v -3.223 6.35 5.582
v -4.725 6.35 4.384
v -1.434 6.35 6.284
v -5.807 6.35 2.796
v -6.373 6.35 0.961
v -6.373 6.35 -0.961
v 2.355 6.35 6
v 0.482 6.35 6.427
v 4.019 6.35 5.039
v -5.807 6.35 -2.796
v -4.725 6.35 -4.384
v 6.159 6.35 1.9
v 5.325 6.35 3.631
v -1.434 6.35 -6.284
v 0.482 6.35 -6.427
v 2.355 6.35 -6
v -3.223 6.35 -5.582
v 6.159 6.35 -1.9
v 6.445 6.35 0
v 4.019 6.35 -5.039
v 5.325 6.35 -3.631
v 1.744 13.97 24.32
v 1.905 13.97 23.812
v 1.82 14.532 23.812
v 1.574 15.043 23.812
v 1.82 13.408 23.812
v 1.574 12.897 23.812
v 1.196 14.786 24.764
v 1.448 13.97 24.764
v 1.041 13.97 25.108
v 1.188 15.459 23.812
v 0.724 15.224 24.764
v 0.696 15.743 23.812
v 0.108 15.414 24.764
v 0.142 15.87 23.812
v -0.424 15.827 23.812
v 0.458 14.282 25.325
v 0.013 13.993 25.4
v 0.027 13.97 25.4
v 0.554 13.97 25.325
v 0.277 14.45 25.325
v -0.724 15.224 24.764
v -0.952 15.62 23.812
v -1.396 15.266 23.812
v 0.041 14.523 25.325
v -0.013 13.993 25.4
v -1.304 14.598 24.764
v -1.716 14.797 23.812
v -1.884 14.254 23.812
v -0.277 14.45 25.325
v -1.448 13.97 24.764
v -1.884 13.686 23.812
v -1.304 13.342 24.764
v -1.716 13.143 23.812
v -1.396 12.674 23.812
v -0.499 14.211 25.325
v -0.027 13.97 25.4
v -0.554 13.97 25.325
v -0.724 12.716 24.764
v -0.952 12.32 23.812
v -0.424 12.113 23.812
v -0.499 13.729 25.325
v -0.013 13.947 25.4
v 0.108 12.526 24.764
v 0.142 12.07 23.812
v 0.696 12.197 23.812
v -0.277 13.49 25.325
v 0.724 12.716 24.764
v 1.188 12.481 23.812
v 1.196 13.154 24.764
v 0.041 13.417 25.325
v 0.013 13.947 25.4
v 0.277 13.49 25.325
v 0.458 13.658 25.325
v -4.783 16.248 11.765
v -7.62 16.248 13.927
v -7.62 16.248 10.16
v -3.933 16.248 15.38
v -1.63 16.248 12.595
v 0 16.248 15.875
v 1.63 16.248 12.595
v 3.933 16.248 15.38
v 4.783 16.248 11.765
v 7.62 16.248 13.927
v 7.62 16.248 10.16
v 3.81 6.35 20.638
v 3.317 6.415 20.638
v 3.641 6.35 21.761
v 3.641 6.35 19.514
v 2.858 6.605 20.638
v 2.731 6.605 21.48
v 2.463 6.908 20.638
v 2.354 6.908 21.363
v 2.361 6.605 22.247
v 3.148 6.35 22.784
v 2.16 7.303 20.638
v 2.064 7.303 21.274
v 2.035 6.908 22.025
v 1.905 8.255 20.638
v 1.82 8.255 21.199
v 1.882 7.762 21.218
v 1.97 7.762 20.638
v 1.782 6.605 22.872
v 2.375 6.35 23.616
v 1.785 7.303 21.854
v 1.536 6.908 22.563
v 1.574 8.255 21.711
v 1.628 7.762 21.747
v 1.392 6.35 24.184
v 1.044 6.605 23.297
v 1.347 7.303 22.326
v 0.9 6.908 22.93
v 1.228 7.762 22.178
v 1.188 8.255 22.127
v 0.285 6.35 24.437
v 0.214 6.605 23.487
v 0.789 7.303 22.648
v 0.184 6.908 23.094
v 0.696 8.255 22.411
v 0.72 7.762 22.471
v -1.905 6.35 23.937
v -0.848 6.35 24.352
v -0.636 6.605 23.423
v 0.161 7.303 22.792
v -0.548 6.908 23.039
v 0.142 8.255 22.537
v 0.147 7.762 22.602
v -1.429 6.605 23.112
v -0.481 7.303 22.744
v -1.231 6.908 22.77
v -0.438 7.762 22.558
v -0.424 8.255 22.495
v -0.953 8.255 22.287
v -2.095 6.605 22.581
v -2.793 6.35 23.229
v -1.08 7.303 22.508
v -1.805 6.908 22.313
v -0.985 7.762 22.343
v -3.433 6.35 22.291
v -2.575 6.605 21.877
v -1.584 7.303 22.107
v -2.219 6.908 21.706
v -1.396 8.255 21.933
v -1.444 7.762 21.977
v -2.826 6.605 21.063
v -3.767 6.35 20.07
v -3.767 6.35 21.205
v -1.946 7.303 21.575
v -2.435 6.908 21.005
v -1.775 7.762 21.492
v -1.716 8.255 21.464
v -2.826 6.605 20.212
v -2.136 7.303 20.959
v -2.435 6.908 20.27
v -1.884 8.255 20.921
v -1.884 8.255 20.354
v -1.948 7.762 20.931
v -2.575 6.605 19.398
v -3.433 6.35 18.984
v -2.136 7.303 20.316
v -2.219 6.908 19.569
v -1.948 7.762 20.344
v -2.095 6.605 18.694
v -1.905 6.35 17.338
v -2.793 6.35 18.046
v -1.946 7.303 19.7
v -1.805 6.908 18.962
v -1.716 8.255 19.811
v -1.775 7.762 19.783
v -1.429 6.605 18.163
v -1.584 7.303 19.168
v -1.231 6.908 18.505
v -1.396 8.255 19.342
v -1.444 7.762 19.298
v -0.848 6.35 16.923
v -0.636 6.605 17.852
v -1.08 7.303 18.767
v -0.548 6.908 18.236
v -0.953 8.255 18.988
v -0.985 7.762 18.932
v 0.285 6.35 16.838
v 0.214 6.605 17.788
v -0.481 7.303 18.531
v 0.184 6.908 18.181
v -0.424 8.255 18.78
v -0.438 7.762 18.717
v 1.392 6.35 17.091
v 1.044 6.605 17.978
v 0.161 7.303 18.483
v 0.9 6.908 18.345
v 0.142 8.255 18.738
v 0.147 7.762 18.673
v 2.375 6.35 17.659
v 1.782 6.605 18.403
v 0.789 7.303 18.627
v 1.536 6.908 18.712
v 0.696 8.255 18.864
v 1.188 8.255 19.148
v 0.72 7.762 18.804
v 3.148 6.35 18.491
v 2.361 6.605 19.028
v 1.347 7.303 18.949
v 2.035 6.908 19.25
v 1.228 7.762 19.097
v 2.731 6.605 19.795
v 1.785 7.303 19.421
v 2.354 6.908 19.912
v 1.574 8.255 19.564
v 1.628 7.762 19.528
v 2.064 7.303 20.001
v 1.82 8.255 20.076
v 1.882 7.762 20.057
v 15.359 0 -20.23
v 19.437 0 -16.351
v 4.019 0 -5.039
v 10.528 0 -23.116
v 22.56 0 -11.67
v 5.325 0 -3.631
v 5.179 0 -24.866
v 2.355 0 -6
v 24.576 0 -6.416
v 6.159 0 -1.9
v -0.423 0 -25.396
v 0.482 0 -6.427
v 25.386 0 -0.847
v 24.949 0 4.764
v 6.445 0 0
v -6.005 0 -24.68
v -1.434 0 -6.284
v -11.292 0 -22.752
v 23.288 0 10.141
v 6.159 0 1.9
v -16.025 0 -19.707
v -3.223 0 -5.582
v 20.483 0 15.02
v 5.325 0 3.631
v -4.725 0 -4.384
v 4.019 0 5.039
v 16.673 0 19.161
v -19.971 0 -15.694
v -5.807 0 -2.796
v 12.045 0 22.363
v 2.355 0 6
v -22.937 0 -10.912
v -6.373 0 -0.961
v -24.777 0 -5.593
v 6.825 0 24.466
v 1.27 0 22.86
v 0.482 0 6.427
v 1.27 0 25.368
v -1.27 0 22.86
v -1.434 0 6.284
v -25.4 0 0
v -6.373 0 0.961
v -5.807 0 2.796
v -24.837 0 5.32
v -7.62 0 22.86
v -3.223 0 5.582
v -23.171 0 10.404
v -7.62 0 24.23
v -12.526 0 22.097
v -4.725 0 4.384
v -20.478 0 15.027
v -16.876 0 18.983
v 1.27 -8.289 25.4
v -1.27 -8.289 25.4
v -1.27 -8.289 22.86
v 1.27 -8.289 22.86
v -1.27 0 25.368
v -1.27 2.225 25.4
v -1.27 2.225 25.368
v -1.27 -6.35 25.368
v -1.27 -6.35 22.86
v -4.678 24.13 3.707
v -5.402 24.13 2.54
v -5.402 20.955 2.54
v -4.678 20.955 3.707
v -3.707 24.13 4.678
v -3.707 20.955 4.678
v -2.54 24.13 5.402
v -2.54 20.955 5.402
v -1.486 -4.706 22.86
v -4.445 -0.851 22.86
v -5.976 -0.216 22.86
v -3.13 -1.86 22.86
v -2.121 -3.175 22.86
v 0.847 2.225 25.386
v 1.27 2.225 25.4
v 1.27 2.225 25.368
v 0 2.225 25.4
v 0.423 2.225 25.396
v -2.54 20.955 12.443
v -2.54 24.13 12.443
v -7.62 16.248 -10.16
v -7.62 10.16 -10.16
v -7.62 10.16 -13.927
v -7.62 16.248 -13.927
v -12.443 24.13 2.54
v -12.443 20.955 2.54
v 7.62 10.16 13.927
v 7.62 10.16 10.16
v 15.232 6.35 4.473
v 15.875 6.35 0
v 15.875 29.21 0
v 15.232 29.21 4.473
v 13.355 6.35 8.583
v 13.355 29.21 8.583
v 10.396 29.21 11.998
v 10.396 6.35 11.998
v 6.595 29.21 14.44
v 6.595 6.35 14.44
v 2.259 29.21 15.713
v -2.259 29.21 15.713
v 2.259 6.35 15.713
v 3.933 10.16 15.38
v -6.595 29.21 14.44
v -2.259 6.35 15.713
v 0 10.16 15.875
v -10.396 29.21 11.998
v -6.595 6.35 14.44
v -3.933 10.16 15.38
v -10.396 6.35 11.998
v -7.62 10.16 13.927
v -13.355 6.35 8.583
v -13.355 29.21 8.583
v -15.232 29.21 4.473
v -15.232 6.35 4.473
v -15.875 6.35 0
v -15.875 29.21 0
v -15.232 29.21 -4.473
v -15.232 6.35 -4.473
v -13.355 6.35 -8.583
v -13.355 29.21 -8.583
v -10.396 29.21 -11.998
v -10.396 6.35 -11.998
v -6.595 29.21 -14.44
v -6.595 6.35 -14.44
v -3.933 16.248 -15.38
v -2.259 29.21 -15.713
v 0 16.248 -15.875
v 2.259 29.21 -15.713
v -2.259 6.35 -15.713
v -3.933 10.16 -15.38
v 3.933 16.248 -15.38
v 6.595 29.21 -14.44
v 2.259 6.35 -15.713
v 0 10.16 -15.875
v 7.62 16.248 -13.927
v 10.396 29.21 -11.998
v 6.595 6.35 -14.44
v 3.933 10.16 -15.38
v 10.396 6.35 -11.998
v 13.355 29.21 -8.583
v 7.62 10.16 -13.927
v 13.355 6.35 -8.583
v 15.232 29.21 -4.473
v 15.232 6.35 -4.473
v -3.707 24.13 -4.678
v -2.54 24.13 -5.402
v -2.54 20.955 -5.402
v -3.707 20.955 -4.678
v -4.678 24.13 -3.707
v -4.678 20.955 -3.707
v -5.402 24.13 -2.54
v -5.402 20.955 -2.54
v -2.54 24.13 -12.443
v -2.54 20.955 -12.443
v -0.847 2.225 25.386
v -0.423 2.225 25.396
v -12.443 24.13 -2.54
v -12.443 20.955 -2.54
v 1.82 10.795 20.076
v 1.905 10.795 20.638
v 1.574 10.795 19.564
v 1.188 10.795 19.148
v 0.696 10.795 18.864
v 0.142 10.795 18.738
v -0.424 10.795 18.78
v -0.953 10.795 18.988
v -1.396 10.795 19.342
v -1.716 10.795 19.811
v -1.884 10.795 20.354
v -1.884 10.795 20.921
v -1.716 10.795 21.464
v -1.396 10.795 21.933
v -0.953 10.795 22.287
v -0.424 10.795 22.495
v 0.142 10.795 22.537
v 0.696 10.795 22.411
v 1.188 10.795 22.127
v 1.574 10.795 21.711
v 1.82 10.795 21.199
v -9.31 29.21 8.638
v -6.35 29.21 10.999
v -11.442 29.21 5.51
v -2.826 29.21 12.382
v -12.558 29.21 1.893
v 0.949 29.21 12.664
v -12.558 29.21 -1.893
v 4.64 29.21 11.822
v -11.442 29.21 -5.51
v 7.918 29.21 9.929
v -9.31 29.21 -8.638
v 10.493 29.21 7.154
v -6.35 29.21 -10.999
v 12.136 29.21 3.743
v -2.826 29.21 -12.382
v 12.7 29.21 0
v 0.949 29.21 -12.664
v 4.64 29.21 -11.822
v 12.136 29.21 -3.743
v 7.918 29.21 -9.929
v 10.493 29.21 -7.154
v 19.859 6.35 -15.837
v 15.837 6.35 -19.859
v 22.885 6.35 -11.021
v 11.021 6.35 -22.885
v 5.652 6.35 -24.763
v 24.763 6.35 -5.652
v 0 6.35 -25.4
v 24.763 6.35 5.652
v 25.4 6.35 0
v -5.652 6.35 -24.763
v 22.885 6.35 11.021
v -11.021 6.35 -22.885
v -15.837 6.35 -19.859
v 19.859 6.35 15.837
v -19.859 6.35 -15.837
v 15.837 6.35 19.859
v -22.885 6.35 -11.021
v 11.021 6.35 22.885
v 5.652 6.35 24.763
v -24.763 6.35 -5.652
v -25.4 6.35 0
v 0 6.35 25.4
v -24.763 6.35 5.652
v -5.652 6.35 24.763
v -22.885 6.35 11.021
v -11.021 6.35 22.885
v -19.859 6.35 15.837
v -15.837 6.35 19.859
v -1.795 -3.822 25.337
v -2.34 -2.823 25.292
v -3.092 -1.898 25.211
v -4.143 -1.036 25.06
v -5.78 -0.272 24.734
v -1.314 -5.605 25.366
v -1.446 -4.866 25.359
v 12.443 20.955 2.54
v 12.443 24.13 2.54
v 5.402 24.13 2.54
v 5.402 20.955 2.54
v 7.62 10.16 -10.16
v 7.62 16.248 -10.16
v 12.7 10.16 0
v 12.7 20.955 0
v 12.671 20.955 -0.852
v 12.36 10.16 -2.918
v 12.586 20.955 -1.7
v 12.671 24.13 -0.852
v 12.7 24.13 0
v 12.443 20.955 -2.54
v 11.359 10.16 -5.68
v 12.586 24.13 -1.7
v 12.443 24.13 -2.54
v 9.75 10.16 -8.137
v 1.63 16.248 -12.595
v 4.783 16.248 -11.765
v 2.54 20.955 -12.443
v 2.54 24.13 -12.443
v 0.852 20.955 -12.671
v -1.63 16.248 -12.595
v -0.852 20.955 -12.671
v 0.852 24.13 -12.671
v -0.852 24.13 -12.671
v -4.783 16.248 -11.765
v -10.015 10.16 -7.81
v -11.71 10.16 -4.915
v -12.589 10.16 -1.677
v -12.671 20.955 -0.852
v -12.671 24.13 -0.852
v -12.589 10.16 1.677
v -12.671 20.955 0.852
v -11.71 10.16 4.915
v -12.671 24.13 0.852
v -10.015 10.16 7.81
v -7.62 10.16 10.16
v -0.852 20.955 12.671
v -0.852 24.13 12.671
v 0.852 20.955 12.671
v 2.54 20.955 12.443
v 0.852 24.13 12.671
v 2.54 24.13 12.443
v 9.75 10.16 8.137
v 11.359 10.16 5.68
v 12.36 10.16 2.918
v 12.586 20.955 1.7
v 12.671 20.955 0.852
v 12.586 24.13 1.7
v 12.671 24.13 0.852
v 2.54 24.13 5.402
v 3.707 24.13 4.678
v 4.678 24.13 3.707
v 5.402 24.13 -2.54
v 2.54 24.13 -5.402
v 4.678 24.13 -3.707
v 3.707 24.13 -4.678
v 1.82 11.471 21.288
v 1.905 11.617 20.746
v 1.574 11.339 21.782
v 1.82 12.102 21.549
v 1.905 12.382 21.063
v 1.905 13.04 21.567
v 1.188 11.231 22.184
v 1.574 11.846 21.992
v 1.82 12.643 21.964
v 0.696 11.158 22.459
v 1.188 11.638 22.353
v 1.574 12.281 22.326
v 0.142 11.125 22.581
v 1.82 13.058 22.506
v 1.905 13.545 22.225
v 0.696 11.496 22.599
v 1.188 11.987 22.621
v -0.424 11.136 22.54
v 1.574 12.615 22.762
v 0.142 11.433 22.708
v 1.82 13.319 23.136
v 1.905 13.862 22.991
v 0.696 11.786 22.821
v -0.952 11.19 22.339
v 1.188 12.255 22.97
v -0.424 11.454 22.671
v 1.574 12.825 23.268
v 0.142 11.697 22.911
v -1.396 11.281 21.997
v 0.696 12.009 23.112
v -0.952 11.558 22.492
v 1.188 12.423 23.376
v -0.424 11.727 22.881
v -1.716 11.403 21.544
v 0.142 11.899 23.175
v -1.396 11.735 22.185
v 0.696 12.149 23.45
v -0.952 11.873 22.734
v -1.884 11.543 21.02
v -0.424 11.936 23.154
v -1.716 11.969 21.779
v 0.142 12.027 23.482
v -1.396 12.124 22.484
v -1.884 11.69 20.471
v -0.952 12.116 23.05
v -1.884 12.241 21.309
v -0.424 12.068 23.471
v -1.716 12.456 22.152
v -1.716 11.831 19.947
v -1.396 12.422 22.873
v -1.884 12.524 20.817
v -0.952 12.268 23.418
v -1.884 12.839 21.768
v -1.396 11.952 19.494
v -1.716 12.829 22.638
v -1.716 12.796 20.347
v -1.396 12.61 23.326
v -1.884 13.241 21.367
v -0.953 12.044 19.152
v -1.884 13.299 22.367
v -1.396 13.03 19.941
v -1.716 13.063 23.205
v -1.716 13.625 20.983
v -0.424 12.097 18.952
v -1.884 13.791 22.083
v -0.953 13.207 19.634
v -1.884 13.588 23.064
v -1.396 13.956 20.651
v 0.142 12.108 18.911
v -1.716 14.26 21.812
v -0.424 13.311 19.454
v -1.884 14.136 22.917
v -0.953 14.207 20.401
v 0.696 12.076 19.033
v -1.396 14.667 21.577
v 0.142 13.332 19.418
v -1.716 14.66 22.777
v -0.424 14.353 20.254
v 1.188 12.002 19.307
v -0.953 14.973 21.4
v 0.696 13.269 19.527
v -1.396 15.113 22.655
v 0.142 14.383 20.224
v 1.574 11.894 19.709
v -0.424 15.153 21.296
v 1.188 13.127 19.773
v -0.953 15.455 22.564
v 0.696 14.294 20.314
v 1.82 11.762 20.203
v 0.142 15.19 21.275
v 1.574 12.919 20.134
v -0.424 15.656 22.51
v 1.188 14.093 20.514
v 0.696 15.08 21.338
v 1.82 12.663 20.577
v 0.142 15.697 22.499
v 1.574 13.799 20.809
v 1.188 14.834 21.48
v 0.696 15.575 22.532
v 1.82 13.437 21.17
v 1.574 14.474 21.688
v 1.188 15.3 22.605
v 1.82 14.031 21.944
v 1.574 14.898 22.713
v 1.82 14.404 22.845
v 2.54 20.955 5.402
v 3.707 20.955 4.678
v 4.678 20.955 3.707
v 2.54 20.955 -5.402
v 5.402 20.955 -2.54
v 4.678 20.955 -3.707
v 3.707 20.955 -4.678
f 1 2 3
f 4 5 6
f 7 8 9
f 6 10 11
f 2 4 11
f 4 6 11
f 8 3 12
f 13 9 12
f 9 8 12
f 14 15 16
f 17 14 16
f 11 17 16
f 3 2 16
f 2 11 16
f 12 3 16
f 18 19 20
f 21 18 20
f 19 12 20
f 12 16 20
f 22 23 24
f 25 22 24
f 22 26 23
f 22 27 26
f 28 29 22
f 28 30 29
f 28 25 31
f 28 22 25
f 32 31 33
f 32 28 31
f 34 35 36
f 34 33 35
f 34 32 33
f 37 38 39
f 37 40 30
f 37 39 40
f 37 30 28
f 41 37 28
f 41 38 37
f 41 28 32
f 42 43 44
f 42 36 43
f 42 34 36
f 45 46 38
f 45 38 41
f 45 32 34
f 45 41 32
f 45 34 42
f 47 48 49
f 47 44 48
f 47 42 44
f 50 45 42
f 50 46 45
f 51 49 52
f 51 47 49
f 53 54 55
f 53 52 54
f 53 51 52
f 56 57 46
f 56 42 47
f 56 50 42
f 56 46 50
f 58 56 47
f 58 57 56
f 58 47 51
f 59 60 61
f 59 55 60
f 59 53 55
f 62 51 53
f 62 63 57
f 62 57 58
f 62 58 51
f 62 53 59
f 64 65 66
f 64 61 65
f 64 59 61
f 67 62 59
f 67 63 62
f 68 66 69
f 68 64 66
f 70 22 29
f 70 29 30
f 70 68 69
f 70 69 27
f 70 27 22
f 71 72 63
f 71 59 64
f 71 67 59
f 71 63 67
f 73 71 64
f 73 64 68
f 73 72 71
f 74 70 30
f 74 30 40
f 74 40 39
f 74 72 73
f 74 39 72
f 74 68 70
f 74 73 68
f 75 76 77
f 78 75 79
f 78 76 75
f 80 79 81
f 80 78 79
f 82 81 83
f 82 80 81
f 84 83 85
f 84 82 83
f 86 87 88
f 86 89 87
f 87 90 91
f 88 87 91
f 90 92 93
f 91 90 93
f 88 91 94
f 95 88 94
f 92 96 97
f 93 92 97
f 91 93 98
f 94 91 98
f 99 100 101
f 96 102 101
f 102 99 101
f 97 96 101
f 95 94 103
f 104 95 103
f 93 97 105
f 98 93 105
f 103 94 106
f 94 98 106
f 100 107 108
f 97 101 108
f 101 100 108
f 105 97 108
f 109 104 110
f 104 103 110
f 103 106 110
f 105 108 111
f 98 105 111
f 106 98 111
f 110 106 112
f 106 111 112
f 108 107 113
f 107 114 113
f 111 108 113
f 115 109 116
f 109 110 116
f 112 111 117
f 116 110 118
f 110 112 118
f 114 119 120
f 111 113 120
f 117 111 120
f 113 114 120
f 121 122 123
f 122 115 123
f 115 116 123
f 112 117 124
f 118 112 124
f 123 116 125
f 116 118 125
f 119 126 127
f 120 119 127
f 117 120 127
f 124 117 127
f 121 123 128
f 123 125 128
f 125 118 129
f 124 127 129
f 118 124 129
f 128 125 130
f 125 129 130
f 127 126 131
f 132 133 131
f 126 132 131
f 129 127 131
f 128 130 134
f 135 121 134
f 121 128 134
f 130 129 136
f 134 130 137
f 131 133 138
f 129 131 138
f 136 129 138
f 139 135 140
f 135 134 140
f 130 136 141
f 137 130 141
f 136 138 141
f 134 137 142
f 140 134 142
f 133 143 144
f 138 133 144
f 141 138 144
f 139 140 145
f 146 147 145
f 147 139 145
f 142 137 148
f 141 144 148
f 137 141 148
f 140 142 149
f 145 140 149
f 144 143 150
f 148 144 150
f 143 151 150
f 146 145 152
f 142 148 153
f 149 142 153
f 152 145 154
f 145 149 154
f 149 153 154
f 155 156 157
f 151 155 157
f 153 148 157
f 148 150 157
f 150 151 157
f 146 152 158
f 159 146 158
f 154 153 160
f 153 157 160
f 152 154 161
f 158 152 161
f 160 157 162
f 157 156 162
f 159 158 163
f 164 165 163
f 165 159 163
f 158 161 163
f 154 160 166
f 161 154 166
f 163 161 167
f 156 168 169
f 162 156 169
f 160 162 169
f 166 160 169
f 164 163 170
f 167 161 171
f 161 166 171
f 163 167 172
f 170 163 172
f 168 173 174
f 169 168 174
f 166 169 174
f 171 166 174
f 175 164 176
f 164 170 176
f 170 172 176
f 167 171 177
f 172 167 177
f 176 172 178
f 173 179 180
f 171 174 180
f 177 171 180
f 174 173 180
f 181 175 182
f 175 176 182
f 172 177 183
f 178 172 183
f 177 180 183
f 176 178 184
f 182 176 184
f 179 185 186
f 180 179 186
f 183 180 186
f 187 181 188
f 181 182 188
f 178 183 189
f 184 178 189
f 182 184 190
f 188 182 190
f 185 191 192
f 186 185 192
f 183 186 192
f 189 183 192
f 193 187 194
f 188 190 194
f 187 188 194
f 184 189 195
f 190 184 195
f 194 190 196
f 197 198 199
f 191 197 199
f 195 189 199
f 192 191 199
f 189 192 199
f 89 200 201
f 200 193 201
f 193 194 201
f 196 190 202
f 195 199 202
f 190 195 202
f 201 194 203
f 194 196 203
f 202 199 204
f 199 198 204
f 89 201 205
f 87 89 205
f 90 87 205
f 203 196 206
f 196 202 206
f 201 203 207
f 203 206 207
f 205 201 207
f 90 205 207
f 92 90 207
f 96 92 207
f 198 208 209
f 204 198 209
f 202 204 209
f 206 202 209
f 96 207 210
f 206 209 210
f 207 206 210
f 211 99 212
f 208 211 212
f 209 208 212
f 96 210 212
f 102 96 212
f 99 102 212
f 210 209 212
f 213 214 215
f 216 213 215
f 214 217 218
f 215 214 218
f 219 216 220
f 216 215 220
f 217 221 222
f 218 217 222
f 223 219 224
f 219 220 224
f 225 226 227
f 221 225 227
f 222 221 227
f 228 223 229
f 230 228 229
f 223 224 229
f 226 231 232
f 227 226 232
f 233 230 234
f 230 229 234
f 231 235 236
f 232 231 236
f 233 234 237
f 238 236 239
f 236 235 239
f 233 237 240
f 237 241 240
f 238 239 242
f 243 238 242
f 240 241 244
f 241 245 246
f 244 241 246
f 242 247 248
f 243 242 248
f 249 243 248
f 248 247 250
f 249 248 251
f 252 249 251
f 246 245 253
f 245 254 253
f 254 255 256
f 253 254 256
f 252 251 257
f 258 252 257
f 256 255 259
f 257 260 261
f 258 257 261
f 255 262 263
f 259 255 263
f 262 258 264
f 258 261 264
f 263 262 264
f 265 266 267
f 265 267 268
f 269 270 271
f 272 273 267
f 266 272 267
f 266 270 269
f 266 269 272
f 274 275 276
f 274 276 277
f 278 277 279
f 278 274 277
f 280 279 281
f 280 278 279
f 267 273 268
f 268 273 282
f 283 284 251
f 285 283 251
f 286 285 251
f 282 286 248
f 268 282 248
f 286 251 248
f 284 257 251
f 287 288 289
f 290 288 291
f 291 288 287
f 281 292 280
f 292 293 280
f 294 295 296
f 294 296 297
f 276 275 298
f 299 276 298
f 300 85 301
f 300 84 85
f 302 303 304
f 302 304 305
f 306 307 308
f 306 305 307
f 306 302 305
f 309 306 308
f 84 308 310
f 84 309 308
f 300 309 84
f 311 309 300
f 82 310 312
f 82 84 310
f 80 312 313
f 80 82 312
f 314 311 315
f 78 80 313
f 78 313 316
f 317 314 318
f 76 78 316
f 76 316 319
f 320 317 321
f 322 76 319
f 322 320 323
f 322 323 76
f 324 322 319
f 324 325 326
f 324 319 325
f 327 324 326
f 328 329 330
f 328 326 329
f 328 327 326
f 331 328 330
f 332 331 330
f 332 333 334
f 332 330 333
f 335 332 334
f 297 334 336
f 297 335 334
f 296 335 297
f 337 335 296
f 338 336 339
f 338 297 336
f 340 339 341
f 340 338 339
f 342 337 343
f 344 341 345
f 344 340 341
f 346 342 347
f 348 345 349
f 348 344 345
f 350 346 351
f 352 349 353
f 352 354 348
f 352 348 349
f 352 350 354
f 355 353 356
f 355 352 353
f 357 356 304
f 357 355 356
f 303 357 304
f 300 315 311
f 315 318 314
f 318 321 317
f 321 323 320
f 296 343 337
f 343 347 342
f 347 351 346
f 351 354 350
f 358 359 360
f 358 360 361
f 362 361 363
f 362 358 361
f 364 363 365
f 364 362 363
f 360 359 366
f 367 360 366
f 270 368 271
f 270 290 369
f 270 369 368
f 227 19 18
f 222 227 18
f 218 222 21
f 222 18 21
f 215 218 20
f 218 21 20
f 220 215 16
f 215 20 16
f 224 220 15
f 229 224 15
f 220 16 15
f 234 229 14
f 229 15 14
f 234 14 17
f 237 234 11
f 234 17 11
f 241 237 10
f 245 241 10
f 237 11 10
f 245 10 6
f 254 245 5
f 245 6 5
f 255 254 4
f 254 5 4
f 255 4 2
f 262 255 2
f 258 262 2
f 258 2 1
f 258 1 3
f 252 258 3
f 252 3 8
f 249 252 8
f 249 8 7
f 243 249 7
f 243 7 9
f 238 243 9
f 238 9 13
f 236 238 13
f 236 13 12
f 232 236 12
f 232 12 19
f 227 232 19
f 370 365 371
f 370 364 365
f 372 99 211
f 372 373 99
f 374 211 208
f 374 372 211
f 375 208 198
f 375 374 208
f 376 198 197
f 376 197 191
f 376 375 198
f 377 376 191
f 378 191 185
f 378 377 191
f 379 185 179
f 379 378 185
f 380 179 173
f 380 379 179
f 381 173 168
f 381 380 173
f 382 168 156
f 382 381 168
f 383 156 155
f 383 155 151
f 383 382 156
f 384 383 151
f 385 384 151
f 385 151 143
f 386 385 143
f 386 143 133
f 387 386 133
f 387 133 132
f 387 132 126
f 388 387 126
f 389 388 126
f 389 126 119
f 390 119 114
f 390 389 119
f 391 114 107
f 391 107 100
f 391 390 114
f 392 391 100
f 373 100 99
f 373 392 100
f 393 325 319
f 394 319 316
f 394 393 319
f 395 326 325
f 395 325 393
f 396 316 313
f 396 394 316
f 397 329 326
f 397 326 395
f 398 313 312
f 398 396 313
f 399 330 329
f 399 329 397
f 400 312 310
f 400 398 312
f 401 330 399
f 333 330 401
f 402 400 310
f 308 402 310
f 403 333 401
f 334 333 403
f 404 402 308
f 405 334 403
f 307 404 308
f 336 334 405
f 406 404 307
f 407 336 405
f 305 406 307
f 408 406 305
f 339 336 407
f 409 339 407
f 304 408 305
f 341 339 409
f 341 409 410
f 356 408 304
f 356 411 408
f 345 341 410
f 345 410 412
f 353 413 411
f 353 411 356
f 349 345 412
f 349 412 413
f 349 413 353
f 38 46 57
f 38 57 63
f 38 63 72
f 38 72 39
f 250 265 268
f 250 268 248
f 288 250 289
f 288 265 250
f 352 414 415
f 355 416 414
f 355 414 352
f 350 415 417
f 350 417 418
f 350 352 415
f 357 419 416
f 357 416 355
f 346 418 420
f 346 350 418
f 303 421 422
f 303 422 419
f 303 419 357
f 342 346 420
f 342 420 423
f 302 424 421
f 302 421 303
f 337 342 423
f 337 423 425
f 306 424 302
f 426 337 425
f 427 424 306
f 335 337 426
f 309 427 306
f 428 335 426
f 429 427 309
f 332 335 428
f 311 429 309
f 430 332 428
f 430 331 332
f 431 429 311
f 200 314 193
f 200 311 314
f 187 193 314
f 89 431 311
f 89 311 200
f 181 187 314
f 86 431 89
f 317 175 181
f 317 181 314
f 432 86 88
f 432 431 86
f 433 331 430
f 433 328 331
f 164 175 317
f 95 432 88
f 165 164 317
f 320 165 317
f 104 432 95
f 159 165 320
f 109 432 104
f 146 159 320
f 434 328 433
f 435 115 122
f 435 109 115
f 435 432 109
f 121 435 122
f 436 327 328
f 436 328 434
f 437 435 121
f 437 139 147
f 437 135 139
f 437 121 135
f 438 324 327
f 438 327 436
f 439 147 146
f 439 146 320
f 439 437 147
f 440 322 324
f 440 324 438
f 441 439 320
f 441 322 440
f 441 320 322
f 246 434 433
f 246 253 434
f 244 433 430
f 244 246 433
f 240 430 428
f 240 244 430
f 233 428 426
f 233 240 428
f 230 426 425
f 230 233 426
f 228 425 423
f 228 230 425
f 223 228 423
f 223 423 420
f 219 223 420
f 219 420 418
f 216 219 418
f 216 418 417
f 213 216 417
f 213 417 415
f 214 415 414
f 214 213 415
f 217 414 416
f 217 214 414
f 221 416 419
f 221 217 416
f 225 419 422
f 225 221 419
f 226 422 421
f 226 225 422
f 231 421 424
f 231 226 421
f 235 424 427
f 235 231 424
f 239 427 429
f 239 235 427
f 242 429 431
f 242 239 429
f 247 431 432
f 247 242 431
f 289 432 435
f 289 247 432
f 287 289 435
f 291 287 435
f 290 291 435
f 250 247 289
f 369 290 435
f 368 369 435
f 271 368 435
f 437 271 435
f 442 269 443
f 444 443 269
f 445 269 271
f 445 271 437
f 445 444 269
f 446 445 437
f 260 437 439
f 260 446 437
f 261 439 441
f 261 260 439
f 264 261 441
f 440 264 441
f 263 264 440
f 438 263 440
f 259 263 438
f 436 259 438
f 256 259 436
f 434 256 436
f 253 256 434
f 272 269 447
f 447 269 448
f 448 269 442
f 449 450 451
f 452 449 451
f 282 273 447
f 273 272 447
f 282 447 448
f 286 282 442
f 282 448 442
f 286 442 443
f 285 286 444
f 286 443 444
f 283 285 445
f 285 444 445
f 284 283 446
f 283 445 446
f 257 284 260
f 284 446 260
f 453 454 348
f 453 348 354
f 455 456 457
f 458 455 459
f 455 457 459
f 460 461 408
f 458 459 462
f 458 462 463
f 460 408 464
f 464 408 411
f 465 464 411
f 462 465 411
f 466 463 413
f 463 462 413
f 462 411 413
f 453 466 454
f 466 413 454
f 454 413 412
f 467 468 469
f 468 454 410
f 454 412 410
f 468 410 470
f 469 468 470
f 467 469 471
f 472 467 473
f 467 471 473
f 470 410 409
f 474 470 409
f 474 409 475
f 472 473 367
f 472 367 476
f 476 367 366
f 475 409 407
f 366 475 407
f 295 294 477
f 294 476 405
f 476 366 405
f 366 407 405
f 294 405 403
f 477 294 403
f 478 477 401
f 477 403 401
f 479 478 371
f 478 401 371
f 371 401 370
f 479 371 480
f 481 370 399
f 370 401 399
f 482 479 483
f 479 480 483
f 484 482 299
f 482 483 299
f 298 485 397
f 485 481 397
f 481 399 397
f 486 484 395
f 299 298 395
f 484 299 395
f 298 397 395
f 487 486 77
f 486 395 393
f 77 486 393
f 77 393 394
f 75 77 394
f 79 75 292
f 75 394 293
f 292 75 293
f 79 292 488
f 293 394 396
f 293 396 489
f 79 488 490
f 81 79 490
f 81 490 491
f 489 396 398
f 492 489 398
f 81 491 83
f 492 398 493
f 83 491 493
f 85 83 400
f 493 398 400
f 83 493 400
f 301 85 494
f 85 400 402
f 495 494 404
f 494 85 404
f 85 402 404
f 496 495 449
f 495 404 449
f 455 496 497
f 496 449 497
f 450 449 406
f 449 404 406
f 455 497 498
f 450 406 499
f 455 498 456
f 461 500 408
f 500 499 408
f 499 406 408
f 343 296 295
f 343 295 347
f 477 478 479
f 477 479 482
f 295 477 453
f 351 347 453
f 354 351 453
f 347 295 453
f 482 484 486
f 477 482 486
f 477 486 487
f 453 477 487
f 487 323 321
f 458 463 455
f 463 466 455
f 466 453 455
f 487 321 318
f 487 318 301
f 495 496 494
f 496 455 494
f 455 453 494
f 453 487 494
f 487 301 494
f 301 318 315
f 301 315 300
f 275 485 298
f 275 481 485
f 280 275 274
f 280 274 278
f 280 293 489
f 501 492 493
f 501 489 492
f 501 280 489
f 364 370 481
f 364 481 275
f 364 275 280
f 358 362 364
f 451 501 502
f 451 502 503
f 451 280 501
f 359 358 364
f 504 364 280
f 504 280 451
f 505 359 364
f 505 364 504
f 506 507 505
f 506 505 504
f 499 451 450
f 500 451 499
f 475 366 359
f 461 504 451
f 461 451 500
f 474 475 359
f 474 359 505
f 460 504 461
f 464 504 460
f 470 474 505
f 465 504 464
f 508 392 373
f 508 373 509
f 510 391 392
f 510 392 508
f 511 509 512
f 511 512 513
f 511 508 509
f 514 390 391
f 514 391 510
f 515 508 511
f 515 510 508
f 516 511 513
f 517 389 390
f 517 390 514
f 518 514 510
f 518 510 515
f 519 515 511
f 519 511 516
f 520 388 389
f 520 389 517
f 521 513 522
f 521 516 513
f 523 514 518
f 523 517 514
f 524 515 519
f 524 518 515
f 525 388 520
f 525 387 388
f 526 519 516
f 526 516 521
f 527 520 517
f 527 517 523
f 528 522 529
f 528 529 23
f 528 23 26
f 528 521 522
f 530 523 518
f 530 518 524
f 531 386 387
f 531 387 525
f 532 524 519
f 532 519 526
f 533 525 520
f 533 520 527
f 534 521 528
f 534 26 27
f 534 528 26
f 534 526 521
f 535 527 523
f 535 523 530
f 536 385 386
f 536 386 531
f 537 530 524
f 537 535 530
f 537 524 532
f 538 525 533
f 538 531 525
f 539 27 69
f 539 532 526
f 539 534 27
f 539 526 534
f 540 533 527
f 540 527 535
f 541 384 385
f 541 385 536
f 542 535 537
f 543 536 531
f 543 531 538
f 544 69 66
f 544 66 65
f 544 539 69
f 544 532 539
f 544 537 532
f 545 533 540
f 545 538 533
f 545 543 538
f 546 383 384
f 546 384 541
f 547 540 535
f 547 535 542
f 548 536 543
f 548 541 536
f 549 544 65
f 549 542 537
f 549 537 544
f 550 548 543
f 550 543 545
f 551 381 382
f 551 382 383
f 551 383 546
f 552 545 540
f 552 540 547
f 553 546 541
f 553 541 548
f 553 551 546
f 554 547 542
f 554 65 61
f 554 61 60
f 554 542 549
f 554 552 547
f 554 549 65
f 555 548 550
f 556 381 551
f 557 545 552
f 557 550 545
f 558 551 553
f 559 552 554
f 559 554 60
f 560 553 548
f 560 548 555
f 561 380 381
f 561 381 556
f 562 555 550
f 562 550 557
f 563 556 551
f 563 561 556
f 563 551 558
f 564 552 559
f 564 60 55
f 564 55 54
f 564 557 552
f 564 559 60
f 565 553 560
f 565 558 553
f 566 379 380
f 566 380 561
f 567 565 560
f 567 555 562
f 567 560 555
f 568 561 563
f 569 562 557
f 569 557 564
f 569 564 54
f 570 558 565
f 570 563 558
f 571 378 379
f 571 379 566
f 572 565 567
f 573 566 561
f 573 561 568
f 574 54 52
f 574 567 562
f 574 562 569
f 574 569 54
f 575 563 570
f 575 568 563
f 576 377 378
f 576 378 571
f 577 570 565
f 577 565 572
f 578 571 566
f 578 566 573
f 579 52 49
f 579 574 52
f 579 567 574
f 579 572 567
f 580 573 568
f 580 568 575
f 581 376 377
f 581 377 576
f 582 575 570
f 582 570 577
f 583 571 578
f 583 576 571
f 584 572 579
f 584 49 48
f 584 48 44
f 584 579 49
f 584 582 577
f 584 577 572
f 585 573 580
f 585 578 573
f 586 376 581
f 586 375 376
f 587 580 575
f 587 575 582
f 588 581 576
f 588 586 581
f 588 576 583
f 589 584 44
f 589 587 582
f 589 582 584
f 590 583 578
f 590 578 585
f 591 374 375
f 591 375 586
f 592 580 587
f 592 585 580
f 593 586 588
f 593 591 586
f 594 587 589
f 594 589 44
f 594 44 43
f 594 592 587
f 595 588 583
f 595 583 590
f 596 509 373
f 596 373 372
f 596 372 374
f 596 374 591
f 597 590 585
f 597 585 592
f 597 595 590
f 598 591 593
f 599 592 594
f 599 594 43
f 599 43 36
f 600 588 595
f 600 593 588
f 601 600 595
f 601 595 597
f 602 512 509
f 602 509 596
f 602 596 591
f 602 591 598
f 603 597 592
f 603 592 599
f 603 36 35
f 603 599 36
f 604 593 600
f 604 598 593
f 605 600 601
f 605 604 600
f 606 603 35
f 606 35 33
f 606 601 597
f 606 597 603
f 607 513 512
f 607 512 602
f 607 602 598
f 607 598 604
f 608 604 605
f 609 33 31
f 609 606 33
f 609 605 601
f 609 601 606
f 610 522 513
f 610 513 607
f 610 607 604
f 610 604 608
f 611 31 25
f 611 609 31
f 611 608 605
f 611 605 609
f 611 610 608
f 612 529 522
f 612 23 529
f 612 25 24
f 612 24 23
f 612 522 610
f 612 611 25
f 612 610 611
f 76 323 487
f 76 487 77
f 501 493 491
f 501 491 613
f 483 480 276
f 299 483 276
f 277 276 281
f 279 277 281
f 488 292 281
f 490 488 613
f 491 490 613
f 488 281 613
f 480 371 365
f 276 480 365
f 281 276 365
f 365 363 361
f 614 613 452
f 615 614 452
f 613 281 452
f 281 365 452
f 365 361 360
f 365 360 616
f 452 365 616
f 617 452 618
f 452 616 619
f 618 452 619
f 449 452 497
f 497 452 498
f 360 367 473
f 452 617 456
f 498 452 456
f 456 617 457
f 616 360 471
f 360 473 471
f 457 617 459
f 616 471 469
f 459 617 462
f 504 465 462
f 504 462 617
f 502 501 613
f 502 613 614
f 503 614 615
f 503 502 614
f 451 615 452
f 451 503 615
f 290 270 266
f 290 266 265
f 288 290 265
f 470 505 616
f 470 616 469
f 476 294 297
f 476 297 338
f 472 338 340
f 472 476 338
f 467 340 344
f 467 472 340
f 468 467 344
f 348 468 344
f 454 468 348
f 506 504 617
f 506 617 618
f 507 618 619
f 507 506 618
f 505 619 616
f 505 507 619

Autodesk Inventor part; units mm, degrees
sketch "Sketch1" plane through (0, 0, 0) normal (0, 1, 0) x (-1, 0, 0)
  circle A0 centre (0, 0) radius 25.4
  dimension "d0" = 50.8
extrude "Extrusion1" add sketch "Sketch1" along normal blind 6.35
sketch "Sketch2" plane through (0, 6.35, 0) normal (0, 1, 0) x (1, 0, 0)
  circle A0 centre (0, 0) radius 25.4 projected
  point P0 (-25.4, 0)
  point P1 (0, -25.4)
  point P2 (25.4, 0)
  point P3 (0, 25.4)
ref_plane "Work Plane1" through (0, 6.35, 25.4) normal (0, 0, 1) x (1, 0, 0)
sketch "Sketch3" plane through (0, 6.35, 25.4) normal (0, 0, 1) x (1, 0, 0)
  line L0 (1.27, -4.1248) -> (-1.27, -4.1248)
  line L1 (-1.27, -4.1248) -> (-1.27, -14.6393)
  line L2 (-1.27, -14.6393) -> (1.27, -14.6393)
  line L3 (1.27, -14.6393) -> (1.27, -4.1248)
  line L4 (25.4, 0) -> (-25.4, 0) projected
  line L5 (0, 0) -> (0, -6.35)
  dimension "d3" = 1.27
  dimension "d4" = 2.54
extrude "Extrusion2" add sketch "Sketch3" against normal blind 2.54
sketch "Sketch4" plane through (0, 6.35, 0) normal (0, 1, 0) x (1, 0, 0)
  circle A0 centre (0, 0) radius 6.4452
  dimension "d9" = 12.8905
extrude "Extrusion3" cut sketch "Sketch4" against normal blind 25.4
sketch "Sketch5" plane through (0, 6.35, 0) normal (0, 1, 0) x (1, 0, 0)
  circle A0 centre (0, 0) radius 15.875
  dimension "d12" = 31.75
extrude "Extrusion4" add sketch "Sketch5" along normal blind 22.86
sketch "Sketch6" plane through (0, 29.21, 0) normal (0, 1, 0) x (1, 0, 0)
  circle A0 centre (0, 0) radius 12.7
  dimension "d15" = 25.4
extrude "Extrusion5" cut sketch "Sketch6" against normal blind 19.05
sketch "Sketch7" plane through (0, 0, 0) normal (0, -1, 0) x (1, 0, 0)
  point P0 (0, 0)
sketch "Sketch8" plane through (0, 0, 0) normal (0, -1, 0) x (1, 0, 0)
  point P0 (0, 0)
sketch "Sketch9" plane through (0, 0, 0) normal (0, -1, 0) x (1, 0, 0)
  point P0 (0, 0)
sketch "Sketch10" plane through (0, 0, 0) normal (0, -1, 0) x (1, 0, 0)
  point P0 (0, 0)
ref_plane "Work Plane2" through (0, 24.13, 0) normal (0, 1, 0) x (1, 0, 0)
sketch "Sketch13" plane through (0, 24.13, 0) normal (0, 1, 0) x (1, 0, 0)
  circle A0 centre (0, 0) radius 12.7
  circle A1 centre (0, 0) radius 12.7 projected
  circle A2 centre (0, 0) radius 5.969
  line L0 (0, 12.7) -> (2.54, 12.7)
  line L1 (0, 12.7) -> (-2.54, 12.7)
  line L2 (0, -12.7) -> (2.54, -12.7)
  line L3 (2.54, -12.7) -> (2.54, 12.7)
  line L4 (0, -12.7) -> (-2.54, -12.7)
  line L5 (-2.54, -12.7) -> (-2.54, 12.7)
  line L6 (12.7, -2.54) -> (-12.7, -2.54)
  line L7 (-12.7, 0) -> (-12.7, -2.54)
  line L8 (-12.7, 0) -> (-12.7, 2.54)
  line L9 (12.7, 2.54) -> (-12.7, 2.54)
  line L10 (12.7, 0) -> (12.7, 2.54)
  line L11 (12.7, 0) -> (12.7, -2.54)
  point P0 (12.4434, -2.54)
  point P1 (5.4016, -2.54)
  point P2 (2.54, -5.4016)
  point P3 (2.54, -12.4434)
  point P4 (-5.4016, -2.54)
  point P5 (-12.4434, -2.54)
  point P6 (-2.54, -12.4434)
  point P7 (-2.54, -5.4016)
  point P8 (5.4016, 2.54)
  point P9 (12.4434, 2.54)
  point P10 (2.54, 12.4434)
  point P11 (2.54, 5.4016)
  point P12 (-12.4434, 2.54)
  point P13 (-5.4016, 2.54)
  point P14 (-2.54, 5.4016)
  point P15 (-2.54, 12.4434)
  dimension "d22" = 11.938
  dimension "d28" = 2.54
  dimension "d29" = 2.54
  dimension "d32" = 90
extrude "Extrusion6" add sketch "Sketch13" against normal blind 3.175 contours A0 L6 A2 L9 | L9 A2 L3 A0 | A0 L3 A2 L6 | L3 A2 L5 A0 | L9 L3 A2 | A2 L6 L3 L9 | A0 L5 A2 L3 | A2 L3 L6 | L3 L9 L5 A2 | L3 L6 L5 L9 | A2 L5 L6 L3 | L5 A2 L9 A0 | L5 L9 A2 | L5 L6 A2 L9 | A0 L6 A2 L5 | A2 L6 L5 | L9 A2 L6 A0
extrude "Extrusion7" cut sketch "Sketch13" against normal blind 3.175 contours L9 A2 L3 A0 | A0 L3 A2 L6 | L5 A2 L9 A0 | A0 L6 A2 L5
sketch "Sketch14" plane through (0, 6.35, 25.4) normal (0, 0, 1) x (1, 0, 0)
  line L0 (-12.7, 3.81) -> (12.7, 3.81) projected
  line L1 (-7.62, 9.8976) -> (7.62, 9.8976)
  line L2 (7.62, 9.8976) -> (7.62, 3.81)
  line L3 (7.62, 3.81) -> (-7.62, 3.81)
  line L4 (-7.62, 3.81) -> (-7.62, 9.8976)
  point P0 (0, -6.35)
  point P1 (-7.62, 3.81)
  dimension "d36" = 15.24
  dimension "d37" = 7.62
extrude "Extrusion8" cut sketch "Sketch14" against normal through all
sketch "Sketch15" plane through (0, 6.35, 0) normal (0, 1, 0) x (1, 0, 0)
  circle A0 centre (0, -20.6375) radius 1.905
  circle A1 centre (0, 0) radius 15.875 projected
  circle A2 centre (0, 0) radius 25.4 projected
  dimension "d40" = 3.81
ref_plane "Work Plane4" through (0, 20.955, 12.4434) normal (1, 0, 0) x (0, 0, -1)
sketch "Sketch17" plane through (0, 20.955, 12.4434) normal (1, 0, 0) x (0, 0, -1)
  line L0 (-6.2891, -14.605) -> (-10.0991, -14.605) projected
  line L1 (-8.1941, -14.605) -> (-8.1941, -10.16)
  line L2 (-11.3691, -6.985) -> (-12.9566, -6.985)
  arc A0 (-8.1941, -10.16) -> (-11.3691, -6.985) centre (-11.3691, -10.16) ccw
  point P0 (12.4434, -20.955)
  point P1 (-8.1941, -6.985)
  dimension "d46" = 7.62
  dimension "d47" = 4.7625
  dimension "d48" = 3.175
sweep "Sweep1" add profiles "Sketch15" path "Sketch17" path curves L1 A0 L2 contours A0
fillet "Fillet1" radius 1.905 1 edges at (-1.905, 13.97, 25.4)
fillet "Fillet2" radius 1.905 1 edges at (-1.905, 6.35, 20.6375)
fillet "Fillet3" radius 6.35 1 edges at (-1.27, 0, 24.1141)
properties part number "Wheel"
